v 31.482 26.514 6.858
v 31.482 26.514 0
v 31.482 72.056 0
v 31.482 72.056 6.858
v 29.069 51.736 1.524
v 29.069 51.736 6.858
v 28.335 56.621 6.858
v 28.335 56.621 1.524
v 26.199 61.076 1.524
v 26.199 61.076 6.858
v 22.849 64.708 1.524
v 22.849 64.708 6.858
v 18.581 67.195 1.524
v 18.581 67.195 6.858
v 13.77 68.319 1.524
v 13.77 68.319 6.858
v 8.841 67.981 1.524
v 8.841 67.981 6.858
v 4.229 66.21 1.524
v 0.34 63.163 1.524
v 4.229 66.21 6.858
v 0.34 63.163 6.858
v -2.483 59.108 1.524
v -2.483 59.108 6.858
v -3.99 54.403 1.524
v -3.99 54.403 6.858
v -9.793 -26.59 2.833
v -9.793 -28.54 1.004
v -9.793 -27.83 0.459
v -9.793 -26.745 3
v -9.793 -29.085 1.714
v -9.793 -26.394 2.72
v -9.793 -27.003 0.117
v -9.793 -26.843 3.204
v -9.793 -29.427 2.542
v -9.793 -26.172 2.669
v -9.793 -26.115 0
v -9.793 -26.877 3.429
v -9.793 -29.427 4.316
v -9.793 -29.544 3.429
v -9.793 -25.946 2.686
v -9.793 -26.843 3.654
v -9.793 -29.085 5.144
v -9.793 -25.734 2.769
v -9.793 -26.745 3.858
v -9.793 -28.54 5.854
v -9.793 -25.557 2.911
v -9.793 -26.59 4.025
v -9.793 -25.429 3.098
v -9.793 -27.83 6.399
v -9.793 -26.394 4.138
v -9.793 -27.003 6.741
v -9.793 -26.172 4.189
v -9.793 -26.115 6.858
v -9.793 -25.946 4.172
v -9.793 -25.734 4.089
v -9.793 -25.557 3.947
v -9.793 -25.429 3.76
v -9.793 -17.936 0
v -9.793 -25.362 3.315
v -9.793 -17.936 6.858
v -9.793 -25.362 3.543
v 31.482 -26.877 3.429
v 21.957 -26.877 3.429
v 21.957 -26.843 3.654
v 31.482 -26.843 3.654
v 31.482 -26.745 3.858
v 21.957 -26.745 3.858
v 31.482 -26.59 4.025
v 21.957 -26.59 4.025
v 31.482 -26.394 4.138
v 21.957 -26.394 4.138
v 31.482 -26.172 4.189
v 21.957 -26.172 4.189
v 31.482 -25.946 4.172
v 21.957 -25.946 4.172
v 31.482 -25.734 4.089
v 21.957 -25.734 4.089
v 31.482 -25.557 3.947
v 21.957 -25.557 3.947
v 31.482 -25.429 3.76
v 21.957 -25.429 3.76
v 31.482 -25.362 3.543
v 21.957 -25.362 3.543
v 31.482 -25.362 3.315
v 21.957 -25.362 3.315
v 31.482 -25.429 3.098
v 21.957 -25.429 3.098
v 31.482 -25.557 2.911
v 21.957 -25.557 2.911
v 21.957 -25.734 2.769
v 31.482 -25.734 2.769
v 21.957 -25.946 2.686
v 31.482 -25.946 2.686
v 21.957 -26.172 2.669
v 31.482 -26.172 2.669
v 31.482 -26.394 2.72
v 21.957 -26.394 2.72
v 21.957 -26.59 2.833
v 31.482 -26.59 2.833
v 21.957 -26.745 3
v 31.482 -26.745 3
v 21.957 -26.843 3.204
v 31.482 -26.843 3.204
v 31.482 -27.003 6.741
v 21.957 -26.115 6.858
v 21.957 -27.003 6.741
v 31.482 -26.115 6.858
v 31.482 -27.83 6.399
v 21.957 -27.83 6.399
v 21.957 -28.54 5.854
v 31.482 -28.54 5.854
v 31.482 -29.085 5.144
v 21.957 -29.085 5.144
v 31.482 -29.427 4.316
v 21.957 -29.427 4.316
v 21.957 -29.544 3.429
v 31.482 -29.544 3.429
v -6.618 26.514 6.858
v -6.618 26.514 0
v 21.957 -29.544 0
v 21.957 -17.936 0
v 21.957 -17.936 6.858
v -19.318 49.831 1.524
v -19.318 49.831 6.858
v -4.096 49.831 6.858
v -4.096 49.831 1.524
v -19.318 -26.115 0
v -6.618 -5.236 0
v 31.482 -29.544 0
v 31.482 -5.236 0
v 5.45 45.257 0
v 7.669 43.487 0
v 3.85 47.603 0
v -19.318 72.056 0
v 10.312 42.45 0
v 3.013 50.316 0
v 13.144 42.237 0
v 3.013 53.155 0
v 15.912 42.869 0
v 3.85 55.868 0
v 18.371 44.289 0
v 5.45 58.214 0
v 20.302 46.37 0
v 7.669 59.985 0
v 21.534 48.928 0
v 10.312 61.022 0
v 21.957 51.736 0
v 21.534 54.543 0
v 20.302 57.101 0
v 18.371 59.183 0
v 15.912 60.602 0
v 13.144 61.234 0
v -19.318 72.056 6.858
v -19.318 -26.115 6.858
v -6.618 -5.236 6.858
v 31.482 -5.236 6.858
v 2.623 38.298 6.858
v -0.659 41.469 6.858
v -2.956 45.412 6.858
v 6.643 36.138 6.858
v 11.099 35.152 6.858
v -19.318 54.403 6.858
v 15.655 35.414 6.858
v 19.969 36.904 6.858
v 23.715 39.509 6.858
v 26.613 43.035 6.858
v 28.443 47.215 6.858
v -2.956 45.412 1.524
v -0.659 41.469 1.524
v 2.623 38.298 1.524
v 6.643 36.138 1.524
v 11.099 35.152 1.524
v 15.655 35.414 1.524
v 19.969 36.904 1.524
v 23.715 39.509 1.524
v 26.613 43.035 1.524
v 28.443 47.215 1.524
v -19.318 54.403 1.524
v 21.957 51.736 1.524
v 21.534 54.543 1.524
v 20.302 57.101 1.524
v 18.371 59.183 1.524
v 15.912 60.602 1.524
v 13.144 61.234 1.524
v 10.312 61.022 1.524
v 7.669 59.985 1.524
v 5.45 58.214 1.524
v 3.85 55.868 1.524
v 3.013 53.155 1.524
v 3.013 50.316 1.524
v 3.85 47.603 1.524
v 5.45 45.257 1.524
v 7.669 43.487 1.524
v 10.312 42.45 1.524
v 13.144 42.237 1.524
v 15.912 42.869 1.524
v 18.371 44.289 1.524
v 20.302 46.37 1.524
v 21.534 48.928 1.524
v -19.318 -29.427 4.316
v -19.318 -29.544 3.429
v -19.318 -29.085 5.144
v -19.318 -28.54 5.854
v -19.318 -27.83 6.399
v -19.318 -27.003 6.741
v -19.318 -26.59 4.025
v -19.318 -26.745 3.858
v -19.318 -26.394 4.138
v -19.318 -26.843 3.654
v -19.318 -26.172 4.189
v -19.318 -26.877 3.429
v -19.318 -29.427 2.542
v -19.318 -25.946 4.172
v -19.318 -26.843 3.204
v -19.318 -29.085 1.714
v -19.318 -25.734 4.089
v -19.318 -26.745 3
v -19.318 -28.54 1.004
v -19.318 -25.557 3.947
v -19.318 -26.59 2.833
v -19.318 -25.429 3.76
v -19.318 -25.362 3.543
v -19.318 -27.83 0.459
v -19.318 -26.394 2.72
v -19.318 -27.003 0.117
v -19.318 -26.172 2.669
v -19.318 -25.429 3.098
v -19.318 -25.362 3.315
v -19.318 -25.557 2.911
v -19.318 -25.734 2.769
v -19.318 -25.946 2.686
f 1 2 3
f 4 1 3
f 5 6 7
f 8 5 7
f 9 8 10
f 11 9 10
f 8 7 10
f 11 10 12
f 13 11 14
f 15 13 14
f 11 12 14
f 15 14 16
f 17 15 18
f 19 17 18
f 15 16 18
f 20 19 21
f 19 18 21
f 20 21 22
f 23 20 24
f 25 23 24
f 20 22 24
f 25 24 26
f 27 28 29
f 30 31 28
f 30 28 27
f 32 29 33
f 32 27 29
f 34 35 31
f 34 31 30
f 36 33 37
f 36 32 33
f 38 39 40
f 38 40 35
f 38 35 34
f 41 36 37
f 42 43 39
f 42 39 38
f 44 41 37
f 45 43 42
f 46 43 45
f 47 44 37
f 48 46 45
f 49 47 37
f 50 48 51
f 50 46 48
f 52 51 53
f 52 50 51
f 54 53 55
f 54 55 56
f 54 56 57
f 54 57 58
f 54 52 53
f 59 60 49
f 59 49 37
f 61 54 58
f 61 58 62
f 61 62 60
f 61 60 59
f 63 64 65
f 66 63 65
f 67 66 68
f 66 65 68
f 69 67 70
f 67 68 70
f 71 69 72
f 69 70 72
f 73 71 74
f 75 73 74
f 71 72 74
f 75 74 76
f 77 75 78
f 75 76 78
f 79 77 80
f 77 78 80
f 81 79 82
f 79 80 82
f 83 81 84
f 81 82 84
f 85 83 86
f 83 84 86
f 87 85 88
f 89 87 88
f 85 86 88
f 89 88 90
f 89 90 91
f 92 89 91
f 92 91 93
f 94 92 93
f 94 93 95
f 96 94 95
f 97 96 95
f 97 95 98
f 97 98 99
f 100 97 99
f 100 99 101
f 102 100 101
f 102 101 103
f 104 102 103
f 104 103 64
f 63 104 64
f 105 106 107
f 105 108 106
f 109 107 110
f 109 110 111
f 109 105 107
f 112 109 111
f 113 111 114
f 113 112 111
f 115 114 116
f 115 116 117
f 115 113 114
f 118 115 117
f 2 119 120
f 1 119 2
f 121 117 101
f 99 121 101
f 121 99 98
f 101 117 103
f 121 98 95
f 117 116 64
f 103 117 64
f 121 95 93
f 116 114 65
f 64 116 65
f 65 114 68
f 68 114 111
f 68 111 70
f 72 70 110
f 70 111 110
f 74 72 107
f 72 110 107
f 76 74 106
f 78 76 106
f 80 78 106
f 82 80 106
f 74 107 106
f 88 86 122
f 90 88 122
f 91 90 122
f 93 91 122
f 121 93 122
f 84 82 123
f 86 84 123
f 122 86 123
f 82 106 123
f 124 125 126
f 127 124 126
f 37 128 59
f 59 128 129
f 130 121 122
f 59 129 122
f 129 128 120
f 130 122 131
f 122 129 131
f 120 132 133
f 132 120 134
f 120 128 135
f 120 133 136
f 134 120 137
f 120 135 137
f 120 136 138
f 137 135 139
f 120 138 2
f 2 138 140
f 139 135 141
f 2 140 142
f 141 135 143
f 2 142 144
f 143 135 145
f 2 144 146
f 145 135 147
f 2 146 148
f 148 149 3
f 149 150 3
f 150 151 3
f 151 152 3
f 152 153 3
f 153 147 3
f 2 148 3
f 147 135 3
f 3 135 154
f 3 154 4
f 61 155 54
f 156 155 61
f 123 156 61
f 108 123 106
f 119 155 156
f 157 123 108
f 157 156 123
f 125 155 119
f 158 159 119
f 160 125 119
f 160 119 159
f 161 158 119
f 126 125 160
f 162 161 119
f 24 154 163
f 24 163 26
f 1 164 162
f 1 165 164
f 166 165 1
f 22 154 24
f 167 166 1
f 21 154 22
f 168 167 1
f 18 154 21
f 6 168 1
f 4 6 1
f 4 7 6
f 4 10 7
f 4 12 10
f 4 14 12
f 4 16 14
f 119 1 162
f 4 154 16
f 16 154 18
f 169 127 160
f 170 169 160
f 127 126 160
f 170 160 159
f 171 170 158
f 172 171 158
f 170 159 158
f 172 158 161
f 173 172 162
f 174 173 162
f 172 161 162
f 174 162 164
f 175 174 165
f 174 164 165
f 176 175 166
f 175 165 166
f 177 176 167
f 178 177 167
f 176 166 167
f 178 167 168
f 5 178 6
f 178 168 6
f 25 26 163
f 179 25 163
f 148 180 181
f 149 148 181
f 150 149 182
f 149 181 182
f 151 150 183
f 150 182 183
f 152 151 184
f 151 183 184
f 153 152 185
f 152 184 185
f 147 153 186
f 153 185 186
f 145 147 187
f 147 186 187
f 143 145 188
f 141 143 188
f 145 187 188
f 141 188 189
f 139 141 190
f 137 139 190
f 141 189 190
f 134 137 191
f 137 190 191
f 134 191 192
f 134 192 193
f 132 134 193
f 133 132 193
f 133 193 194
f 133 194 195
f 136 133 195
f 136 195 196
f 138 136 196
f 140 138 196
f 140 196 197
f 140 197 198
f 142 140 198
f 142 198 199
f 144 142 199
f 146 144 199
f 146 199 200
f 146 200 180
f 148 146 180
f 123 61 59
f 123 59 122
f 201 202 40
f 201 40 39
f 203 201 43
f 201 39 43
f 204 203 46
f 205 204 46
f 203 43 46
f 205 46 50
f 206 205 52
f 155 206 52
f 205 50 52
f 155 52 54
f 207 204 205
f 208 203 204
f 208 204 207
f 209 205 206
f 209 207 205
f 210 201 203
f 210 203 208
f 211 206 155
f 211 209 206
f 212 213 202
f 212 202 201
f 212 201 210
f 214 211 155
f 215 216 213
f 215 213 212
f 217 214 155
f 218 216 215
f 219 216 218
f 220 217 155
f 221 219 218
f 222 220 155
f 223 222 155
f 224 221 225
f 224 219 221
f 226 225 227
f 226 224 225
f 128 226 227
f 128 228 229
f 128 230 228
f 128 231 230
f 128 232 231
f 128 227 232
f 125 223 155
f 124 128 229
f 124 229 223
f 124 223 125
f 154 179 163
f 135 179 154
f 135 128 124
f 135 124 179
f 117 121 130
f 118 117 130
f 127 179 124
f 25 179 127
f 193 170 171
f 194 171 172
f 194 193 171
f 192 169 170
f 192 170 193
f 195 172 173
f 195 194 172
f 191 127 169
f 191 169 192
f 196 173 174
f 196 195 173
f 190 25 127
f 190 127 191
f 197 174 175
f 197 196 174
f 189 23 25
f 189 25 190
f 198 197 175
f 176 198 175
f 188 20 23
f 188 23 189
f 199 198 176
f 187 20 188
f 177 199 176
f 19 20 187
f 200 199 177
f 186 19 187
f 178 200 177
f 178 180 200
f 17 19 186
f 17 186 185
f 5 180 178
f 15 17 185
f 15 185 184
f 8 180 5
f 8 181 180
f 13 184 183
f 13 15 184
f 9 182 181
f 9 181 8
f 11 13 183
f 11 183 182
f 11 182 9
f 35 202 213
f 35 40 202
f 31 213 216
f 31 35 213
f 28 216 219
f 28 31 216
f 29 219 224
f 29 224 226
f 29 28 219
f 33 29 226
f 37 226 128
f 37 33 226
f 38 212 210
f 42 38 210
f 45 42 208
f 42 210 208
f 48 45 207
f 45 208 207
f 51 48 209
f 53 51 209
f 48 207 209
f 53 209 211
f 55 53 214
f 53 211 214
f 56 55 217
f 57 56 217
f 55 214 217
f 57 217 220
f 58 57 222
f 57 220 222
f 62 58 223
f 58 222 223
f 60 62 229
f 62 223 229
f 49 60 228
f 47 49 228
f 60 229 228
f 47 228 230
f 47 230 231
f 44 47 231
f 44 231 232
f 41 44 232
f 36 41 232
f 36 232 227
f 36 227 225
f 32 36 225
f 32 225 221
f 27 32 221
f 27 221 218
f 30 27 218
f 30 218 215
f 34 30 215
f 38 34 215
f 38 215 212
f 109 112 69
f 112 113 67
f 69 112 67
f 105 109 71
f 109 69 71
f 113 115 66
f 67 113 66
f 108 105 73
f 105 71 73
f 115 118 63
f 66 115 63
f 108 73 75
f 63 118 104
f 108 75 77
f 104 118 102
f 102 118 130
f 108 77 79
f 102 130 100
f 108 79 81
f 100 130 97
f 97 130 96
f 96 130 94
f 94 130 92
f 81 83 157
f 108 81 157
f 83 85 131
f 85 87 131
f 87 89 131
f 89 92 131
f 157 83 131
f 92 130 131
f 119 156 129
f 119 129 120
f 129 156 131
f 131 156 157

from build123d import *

# Parameters (mm, degrees)
F0_W      = 50.8
F0_H      = 101.6
F1_DEPTH  = 6.858
F2_R      = 16.637
F3_DEPTH  = 5.334
F4_R      = 9.525
F5_DEPTH  = 25.4
F6_W      = 31.75
F6_H      = 11.6078
F7_DEPTH  = 25.4
F8_W      = 38.1
F8_H      = 31.75
F9_DEPTH  = 25.4
F10_R     = 3.42899
F12_DEPTH = 5.334
F13_R     = 0.762
F14_DEPTH = 50.8


# Not quite as in the source:
# - a fillet or chamfer is up to 0.001 mm smaller than in the source, because OpenCascade refuses the exact size


with BuildPart() as f1:
    # F0 (on Top) → F1 (new body)
    with BuildSketch(Plane.XY):
        with Locations((6.0819597751, 21.255746996)):
            Rectangle(F0_W, F0_H)
    extrude(amount=F1_DEPTH)

    # F2 (on face) → F3 (cut)
    with BuildSketch(Plane.XY.offset(6.858)):
        with Locations((12.4319597751, 51.735746996)):
            Circle(F2_R)
    extrude(amount=-F3_DEPTH, mode=Mode.SUBTRACT)

    # F4 (on face) → F5 (cut)
    with BuildSketch(Plane.XY.offset(1.524)):
        with Locations((12.4319597751, 51.735746996)):
            Circle(F4_R)
    extrude(amount=-F5_DEPTH, mode=Mode.SUBTRACT)

    # F6 (on face) → F7 (cut)
    with BuildSketch(Plane.XY.offset(6.858)):
        with Locations((6.0819597751, -23.740353004)):
            Rectangle(F6_W, F6_H)
    extrude(amount=-F7_DEPTH, mode=Mode.SUBTRACT)

    # F8 (on face) → F9 (cut)
    with BuildSketch(Plane.XY.offset(6.858)):
        with Locations((12.4319597751, 10.638546996)):
            Rectangle(F8_W, F8_H)
    extrude(amount=-F9_DEPTH, mode=Mode.SUBTRACT)

    # F10 (radius 3.429 in the source; OpenCascade refuses exactly that, so slightly less here)
    f10_edges = [f1.edges().sort_by_distance(p)[0] for p in [
        (-14.55554, -29.544253, 6.858),
        (26.71946, -29.544253, 6.858),
        (-14.55554, -29.544253, 0),
    ]]
    fillet(f10_edges, radius=F10_R)

    # F11 (on face) → F12 (cut)
    with BuildSketch(Plane.XY.offset(6.858)):
        with BuildLine():
            Line((-3.9898817782, 54.402746996), (-19.3180402249, 54.402746996))
            Line((-19.3180402249, 54.402746996), (-19.3180402249, 49.830746996))
            Line((-19.3180402249, 49.830746996), (-4.0956154857, 49.830746996))
            ThreePointArc((-4.0956154857, 49.830746996), (-4.2005930385, 52.1203973622), (-3.9898817782, 54.402746996))
        make_face()
    extrude(amount=-F12_DEPTH, mode=Mode.SUBTRACT)

    # F13 (on face) → F14 (cut)
    with BuildSketch(Plane(origin=(-19.3180402249, 0, 0), x_dir=(0, -1, 0), z_dir=(-1, 0, 0))):
        with Locations((26.115253004, 3.429)):
            Circle(F13_R)
    extrude(amount=-F14_DEPTH, mode=Mode.SUBTRACT)


solid = f1.part
